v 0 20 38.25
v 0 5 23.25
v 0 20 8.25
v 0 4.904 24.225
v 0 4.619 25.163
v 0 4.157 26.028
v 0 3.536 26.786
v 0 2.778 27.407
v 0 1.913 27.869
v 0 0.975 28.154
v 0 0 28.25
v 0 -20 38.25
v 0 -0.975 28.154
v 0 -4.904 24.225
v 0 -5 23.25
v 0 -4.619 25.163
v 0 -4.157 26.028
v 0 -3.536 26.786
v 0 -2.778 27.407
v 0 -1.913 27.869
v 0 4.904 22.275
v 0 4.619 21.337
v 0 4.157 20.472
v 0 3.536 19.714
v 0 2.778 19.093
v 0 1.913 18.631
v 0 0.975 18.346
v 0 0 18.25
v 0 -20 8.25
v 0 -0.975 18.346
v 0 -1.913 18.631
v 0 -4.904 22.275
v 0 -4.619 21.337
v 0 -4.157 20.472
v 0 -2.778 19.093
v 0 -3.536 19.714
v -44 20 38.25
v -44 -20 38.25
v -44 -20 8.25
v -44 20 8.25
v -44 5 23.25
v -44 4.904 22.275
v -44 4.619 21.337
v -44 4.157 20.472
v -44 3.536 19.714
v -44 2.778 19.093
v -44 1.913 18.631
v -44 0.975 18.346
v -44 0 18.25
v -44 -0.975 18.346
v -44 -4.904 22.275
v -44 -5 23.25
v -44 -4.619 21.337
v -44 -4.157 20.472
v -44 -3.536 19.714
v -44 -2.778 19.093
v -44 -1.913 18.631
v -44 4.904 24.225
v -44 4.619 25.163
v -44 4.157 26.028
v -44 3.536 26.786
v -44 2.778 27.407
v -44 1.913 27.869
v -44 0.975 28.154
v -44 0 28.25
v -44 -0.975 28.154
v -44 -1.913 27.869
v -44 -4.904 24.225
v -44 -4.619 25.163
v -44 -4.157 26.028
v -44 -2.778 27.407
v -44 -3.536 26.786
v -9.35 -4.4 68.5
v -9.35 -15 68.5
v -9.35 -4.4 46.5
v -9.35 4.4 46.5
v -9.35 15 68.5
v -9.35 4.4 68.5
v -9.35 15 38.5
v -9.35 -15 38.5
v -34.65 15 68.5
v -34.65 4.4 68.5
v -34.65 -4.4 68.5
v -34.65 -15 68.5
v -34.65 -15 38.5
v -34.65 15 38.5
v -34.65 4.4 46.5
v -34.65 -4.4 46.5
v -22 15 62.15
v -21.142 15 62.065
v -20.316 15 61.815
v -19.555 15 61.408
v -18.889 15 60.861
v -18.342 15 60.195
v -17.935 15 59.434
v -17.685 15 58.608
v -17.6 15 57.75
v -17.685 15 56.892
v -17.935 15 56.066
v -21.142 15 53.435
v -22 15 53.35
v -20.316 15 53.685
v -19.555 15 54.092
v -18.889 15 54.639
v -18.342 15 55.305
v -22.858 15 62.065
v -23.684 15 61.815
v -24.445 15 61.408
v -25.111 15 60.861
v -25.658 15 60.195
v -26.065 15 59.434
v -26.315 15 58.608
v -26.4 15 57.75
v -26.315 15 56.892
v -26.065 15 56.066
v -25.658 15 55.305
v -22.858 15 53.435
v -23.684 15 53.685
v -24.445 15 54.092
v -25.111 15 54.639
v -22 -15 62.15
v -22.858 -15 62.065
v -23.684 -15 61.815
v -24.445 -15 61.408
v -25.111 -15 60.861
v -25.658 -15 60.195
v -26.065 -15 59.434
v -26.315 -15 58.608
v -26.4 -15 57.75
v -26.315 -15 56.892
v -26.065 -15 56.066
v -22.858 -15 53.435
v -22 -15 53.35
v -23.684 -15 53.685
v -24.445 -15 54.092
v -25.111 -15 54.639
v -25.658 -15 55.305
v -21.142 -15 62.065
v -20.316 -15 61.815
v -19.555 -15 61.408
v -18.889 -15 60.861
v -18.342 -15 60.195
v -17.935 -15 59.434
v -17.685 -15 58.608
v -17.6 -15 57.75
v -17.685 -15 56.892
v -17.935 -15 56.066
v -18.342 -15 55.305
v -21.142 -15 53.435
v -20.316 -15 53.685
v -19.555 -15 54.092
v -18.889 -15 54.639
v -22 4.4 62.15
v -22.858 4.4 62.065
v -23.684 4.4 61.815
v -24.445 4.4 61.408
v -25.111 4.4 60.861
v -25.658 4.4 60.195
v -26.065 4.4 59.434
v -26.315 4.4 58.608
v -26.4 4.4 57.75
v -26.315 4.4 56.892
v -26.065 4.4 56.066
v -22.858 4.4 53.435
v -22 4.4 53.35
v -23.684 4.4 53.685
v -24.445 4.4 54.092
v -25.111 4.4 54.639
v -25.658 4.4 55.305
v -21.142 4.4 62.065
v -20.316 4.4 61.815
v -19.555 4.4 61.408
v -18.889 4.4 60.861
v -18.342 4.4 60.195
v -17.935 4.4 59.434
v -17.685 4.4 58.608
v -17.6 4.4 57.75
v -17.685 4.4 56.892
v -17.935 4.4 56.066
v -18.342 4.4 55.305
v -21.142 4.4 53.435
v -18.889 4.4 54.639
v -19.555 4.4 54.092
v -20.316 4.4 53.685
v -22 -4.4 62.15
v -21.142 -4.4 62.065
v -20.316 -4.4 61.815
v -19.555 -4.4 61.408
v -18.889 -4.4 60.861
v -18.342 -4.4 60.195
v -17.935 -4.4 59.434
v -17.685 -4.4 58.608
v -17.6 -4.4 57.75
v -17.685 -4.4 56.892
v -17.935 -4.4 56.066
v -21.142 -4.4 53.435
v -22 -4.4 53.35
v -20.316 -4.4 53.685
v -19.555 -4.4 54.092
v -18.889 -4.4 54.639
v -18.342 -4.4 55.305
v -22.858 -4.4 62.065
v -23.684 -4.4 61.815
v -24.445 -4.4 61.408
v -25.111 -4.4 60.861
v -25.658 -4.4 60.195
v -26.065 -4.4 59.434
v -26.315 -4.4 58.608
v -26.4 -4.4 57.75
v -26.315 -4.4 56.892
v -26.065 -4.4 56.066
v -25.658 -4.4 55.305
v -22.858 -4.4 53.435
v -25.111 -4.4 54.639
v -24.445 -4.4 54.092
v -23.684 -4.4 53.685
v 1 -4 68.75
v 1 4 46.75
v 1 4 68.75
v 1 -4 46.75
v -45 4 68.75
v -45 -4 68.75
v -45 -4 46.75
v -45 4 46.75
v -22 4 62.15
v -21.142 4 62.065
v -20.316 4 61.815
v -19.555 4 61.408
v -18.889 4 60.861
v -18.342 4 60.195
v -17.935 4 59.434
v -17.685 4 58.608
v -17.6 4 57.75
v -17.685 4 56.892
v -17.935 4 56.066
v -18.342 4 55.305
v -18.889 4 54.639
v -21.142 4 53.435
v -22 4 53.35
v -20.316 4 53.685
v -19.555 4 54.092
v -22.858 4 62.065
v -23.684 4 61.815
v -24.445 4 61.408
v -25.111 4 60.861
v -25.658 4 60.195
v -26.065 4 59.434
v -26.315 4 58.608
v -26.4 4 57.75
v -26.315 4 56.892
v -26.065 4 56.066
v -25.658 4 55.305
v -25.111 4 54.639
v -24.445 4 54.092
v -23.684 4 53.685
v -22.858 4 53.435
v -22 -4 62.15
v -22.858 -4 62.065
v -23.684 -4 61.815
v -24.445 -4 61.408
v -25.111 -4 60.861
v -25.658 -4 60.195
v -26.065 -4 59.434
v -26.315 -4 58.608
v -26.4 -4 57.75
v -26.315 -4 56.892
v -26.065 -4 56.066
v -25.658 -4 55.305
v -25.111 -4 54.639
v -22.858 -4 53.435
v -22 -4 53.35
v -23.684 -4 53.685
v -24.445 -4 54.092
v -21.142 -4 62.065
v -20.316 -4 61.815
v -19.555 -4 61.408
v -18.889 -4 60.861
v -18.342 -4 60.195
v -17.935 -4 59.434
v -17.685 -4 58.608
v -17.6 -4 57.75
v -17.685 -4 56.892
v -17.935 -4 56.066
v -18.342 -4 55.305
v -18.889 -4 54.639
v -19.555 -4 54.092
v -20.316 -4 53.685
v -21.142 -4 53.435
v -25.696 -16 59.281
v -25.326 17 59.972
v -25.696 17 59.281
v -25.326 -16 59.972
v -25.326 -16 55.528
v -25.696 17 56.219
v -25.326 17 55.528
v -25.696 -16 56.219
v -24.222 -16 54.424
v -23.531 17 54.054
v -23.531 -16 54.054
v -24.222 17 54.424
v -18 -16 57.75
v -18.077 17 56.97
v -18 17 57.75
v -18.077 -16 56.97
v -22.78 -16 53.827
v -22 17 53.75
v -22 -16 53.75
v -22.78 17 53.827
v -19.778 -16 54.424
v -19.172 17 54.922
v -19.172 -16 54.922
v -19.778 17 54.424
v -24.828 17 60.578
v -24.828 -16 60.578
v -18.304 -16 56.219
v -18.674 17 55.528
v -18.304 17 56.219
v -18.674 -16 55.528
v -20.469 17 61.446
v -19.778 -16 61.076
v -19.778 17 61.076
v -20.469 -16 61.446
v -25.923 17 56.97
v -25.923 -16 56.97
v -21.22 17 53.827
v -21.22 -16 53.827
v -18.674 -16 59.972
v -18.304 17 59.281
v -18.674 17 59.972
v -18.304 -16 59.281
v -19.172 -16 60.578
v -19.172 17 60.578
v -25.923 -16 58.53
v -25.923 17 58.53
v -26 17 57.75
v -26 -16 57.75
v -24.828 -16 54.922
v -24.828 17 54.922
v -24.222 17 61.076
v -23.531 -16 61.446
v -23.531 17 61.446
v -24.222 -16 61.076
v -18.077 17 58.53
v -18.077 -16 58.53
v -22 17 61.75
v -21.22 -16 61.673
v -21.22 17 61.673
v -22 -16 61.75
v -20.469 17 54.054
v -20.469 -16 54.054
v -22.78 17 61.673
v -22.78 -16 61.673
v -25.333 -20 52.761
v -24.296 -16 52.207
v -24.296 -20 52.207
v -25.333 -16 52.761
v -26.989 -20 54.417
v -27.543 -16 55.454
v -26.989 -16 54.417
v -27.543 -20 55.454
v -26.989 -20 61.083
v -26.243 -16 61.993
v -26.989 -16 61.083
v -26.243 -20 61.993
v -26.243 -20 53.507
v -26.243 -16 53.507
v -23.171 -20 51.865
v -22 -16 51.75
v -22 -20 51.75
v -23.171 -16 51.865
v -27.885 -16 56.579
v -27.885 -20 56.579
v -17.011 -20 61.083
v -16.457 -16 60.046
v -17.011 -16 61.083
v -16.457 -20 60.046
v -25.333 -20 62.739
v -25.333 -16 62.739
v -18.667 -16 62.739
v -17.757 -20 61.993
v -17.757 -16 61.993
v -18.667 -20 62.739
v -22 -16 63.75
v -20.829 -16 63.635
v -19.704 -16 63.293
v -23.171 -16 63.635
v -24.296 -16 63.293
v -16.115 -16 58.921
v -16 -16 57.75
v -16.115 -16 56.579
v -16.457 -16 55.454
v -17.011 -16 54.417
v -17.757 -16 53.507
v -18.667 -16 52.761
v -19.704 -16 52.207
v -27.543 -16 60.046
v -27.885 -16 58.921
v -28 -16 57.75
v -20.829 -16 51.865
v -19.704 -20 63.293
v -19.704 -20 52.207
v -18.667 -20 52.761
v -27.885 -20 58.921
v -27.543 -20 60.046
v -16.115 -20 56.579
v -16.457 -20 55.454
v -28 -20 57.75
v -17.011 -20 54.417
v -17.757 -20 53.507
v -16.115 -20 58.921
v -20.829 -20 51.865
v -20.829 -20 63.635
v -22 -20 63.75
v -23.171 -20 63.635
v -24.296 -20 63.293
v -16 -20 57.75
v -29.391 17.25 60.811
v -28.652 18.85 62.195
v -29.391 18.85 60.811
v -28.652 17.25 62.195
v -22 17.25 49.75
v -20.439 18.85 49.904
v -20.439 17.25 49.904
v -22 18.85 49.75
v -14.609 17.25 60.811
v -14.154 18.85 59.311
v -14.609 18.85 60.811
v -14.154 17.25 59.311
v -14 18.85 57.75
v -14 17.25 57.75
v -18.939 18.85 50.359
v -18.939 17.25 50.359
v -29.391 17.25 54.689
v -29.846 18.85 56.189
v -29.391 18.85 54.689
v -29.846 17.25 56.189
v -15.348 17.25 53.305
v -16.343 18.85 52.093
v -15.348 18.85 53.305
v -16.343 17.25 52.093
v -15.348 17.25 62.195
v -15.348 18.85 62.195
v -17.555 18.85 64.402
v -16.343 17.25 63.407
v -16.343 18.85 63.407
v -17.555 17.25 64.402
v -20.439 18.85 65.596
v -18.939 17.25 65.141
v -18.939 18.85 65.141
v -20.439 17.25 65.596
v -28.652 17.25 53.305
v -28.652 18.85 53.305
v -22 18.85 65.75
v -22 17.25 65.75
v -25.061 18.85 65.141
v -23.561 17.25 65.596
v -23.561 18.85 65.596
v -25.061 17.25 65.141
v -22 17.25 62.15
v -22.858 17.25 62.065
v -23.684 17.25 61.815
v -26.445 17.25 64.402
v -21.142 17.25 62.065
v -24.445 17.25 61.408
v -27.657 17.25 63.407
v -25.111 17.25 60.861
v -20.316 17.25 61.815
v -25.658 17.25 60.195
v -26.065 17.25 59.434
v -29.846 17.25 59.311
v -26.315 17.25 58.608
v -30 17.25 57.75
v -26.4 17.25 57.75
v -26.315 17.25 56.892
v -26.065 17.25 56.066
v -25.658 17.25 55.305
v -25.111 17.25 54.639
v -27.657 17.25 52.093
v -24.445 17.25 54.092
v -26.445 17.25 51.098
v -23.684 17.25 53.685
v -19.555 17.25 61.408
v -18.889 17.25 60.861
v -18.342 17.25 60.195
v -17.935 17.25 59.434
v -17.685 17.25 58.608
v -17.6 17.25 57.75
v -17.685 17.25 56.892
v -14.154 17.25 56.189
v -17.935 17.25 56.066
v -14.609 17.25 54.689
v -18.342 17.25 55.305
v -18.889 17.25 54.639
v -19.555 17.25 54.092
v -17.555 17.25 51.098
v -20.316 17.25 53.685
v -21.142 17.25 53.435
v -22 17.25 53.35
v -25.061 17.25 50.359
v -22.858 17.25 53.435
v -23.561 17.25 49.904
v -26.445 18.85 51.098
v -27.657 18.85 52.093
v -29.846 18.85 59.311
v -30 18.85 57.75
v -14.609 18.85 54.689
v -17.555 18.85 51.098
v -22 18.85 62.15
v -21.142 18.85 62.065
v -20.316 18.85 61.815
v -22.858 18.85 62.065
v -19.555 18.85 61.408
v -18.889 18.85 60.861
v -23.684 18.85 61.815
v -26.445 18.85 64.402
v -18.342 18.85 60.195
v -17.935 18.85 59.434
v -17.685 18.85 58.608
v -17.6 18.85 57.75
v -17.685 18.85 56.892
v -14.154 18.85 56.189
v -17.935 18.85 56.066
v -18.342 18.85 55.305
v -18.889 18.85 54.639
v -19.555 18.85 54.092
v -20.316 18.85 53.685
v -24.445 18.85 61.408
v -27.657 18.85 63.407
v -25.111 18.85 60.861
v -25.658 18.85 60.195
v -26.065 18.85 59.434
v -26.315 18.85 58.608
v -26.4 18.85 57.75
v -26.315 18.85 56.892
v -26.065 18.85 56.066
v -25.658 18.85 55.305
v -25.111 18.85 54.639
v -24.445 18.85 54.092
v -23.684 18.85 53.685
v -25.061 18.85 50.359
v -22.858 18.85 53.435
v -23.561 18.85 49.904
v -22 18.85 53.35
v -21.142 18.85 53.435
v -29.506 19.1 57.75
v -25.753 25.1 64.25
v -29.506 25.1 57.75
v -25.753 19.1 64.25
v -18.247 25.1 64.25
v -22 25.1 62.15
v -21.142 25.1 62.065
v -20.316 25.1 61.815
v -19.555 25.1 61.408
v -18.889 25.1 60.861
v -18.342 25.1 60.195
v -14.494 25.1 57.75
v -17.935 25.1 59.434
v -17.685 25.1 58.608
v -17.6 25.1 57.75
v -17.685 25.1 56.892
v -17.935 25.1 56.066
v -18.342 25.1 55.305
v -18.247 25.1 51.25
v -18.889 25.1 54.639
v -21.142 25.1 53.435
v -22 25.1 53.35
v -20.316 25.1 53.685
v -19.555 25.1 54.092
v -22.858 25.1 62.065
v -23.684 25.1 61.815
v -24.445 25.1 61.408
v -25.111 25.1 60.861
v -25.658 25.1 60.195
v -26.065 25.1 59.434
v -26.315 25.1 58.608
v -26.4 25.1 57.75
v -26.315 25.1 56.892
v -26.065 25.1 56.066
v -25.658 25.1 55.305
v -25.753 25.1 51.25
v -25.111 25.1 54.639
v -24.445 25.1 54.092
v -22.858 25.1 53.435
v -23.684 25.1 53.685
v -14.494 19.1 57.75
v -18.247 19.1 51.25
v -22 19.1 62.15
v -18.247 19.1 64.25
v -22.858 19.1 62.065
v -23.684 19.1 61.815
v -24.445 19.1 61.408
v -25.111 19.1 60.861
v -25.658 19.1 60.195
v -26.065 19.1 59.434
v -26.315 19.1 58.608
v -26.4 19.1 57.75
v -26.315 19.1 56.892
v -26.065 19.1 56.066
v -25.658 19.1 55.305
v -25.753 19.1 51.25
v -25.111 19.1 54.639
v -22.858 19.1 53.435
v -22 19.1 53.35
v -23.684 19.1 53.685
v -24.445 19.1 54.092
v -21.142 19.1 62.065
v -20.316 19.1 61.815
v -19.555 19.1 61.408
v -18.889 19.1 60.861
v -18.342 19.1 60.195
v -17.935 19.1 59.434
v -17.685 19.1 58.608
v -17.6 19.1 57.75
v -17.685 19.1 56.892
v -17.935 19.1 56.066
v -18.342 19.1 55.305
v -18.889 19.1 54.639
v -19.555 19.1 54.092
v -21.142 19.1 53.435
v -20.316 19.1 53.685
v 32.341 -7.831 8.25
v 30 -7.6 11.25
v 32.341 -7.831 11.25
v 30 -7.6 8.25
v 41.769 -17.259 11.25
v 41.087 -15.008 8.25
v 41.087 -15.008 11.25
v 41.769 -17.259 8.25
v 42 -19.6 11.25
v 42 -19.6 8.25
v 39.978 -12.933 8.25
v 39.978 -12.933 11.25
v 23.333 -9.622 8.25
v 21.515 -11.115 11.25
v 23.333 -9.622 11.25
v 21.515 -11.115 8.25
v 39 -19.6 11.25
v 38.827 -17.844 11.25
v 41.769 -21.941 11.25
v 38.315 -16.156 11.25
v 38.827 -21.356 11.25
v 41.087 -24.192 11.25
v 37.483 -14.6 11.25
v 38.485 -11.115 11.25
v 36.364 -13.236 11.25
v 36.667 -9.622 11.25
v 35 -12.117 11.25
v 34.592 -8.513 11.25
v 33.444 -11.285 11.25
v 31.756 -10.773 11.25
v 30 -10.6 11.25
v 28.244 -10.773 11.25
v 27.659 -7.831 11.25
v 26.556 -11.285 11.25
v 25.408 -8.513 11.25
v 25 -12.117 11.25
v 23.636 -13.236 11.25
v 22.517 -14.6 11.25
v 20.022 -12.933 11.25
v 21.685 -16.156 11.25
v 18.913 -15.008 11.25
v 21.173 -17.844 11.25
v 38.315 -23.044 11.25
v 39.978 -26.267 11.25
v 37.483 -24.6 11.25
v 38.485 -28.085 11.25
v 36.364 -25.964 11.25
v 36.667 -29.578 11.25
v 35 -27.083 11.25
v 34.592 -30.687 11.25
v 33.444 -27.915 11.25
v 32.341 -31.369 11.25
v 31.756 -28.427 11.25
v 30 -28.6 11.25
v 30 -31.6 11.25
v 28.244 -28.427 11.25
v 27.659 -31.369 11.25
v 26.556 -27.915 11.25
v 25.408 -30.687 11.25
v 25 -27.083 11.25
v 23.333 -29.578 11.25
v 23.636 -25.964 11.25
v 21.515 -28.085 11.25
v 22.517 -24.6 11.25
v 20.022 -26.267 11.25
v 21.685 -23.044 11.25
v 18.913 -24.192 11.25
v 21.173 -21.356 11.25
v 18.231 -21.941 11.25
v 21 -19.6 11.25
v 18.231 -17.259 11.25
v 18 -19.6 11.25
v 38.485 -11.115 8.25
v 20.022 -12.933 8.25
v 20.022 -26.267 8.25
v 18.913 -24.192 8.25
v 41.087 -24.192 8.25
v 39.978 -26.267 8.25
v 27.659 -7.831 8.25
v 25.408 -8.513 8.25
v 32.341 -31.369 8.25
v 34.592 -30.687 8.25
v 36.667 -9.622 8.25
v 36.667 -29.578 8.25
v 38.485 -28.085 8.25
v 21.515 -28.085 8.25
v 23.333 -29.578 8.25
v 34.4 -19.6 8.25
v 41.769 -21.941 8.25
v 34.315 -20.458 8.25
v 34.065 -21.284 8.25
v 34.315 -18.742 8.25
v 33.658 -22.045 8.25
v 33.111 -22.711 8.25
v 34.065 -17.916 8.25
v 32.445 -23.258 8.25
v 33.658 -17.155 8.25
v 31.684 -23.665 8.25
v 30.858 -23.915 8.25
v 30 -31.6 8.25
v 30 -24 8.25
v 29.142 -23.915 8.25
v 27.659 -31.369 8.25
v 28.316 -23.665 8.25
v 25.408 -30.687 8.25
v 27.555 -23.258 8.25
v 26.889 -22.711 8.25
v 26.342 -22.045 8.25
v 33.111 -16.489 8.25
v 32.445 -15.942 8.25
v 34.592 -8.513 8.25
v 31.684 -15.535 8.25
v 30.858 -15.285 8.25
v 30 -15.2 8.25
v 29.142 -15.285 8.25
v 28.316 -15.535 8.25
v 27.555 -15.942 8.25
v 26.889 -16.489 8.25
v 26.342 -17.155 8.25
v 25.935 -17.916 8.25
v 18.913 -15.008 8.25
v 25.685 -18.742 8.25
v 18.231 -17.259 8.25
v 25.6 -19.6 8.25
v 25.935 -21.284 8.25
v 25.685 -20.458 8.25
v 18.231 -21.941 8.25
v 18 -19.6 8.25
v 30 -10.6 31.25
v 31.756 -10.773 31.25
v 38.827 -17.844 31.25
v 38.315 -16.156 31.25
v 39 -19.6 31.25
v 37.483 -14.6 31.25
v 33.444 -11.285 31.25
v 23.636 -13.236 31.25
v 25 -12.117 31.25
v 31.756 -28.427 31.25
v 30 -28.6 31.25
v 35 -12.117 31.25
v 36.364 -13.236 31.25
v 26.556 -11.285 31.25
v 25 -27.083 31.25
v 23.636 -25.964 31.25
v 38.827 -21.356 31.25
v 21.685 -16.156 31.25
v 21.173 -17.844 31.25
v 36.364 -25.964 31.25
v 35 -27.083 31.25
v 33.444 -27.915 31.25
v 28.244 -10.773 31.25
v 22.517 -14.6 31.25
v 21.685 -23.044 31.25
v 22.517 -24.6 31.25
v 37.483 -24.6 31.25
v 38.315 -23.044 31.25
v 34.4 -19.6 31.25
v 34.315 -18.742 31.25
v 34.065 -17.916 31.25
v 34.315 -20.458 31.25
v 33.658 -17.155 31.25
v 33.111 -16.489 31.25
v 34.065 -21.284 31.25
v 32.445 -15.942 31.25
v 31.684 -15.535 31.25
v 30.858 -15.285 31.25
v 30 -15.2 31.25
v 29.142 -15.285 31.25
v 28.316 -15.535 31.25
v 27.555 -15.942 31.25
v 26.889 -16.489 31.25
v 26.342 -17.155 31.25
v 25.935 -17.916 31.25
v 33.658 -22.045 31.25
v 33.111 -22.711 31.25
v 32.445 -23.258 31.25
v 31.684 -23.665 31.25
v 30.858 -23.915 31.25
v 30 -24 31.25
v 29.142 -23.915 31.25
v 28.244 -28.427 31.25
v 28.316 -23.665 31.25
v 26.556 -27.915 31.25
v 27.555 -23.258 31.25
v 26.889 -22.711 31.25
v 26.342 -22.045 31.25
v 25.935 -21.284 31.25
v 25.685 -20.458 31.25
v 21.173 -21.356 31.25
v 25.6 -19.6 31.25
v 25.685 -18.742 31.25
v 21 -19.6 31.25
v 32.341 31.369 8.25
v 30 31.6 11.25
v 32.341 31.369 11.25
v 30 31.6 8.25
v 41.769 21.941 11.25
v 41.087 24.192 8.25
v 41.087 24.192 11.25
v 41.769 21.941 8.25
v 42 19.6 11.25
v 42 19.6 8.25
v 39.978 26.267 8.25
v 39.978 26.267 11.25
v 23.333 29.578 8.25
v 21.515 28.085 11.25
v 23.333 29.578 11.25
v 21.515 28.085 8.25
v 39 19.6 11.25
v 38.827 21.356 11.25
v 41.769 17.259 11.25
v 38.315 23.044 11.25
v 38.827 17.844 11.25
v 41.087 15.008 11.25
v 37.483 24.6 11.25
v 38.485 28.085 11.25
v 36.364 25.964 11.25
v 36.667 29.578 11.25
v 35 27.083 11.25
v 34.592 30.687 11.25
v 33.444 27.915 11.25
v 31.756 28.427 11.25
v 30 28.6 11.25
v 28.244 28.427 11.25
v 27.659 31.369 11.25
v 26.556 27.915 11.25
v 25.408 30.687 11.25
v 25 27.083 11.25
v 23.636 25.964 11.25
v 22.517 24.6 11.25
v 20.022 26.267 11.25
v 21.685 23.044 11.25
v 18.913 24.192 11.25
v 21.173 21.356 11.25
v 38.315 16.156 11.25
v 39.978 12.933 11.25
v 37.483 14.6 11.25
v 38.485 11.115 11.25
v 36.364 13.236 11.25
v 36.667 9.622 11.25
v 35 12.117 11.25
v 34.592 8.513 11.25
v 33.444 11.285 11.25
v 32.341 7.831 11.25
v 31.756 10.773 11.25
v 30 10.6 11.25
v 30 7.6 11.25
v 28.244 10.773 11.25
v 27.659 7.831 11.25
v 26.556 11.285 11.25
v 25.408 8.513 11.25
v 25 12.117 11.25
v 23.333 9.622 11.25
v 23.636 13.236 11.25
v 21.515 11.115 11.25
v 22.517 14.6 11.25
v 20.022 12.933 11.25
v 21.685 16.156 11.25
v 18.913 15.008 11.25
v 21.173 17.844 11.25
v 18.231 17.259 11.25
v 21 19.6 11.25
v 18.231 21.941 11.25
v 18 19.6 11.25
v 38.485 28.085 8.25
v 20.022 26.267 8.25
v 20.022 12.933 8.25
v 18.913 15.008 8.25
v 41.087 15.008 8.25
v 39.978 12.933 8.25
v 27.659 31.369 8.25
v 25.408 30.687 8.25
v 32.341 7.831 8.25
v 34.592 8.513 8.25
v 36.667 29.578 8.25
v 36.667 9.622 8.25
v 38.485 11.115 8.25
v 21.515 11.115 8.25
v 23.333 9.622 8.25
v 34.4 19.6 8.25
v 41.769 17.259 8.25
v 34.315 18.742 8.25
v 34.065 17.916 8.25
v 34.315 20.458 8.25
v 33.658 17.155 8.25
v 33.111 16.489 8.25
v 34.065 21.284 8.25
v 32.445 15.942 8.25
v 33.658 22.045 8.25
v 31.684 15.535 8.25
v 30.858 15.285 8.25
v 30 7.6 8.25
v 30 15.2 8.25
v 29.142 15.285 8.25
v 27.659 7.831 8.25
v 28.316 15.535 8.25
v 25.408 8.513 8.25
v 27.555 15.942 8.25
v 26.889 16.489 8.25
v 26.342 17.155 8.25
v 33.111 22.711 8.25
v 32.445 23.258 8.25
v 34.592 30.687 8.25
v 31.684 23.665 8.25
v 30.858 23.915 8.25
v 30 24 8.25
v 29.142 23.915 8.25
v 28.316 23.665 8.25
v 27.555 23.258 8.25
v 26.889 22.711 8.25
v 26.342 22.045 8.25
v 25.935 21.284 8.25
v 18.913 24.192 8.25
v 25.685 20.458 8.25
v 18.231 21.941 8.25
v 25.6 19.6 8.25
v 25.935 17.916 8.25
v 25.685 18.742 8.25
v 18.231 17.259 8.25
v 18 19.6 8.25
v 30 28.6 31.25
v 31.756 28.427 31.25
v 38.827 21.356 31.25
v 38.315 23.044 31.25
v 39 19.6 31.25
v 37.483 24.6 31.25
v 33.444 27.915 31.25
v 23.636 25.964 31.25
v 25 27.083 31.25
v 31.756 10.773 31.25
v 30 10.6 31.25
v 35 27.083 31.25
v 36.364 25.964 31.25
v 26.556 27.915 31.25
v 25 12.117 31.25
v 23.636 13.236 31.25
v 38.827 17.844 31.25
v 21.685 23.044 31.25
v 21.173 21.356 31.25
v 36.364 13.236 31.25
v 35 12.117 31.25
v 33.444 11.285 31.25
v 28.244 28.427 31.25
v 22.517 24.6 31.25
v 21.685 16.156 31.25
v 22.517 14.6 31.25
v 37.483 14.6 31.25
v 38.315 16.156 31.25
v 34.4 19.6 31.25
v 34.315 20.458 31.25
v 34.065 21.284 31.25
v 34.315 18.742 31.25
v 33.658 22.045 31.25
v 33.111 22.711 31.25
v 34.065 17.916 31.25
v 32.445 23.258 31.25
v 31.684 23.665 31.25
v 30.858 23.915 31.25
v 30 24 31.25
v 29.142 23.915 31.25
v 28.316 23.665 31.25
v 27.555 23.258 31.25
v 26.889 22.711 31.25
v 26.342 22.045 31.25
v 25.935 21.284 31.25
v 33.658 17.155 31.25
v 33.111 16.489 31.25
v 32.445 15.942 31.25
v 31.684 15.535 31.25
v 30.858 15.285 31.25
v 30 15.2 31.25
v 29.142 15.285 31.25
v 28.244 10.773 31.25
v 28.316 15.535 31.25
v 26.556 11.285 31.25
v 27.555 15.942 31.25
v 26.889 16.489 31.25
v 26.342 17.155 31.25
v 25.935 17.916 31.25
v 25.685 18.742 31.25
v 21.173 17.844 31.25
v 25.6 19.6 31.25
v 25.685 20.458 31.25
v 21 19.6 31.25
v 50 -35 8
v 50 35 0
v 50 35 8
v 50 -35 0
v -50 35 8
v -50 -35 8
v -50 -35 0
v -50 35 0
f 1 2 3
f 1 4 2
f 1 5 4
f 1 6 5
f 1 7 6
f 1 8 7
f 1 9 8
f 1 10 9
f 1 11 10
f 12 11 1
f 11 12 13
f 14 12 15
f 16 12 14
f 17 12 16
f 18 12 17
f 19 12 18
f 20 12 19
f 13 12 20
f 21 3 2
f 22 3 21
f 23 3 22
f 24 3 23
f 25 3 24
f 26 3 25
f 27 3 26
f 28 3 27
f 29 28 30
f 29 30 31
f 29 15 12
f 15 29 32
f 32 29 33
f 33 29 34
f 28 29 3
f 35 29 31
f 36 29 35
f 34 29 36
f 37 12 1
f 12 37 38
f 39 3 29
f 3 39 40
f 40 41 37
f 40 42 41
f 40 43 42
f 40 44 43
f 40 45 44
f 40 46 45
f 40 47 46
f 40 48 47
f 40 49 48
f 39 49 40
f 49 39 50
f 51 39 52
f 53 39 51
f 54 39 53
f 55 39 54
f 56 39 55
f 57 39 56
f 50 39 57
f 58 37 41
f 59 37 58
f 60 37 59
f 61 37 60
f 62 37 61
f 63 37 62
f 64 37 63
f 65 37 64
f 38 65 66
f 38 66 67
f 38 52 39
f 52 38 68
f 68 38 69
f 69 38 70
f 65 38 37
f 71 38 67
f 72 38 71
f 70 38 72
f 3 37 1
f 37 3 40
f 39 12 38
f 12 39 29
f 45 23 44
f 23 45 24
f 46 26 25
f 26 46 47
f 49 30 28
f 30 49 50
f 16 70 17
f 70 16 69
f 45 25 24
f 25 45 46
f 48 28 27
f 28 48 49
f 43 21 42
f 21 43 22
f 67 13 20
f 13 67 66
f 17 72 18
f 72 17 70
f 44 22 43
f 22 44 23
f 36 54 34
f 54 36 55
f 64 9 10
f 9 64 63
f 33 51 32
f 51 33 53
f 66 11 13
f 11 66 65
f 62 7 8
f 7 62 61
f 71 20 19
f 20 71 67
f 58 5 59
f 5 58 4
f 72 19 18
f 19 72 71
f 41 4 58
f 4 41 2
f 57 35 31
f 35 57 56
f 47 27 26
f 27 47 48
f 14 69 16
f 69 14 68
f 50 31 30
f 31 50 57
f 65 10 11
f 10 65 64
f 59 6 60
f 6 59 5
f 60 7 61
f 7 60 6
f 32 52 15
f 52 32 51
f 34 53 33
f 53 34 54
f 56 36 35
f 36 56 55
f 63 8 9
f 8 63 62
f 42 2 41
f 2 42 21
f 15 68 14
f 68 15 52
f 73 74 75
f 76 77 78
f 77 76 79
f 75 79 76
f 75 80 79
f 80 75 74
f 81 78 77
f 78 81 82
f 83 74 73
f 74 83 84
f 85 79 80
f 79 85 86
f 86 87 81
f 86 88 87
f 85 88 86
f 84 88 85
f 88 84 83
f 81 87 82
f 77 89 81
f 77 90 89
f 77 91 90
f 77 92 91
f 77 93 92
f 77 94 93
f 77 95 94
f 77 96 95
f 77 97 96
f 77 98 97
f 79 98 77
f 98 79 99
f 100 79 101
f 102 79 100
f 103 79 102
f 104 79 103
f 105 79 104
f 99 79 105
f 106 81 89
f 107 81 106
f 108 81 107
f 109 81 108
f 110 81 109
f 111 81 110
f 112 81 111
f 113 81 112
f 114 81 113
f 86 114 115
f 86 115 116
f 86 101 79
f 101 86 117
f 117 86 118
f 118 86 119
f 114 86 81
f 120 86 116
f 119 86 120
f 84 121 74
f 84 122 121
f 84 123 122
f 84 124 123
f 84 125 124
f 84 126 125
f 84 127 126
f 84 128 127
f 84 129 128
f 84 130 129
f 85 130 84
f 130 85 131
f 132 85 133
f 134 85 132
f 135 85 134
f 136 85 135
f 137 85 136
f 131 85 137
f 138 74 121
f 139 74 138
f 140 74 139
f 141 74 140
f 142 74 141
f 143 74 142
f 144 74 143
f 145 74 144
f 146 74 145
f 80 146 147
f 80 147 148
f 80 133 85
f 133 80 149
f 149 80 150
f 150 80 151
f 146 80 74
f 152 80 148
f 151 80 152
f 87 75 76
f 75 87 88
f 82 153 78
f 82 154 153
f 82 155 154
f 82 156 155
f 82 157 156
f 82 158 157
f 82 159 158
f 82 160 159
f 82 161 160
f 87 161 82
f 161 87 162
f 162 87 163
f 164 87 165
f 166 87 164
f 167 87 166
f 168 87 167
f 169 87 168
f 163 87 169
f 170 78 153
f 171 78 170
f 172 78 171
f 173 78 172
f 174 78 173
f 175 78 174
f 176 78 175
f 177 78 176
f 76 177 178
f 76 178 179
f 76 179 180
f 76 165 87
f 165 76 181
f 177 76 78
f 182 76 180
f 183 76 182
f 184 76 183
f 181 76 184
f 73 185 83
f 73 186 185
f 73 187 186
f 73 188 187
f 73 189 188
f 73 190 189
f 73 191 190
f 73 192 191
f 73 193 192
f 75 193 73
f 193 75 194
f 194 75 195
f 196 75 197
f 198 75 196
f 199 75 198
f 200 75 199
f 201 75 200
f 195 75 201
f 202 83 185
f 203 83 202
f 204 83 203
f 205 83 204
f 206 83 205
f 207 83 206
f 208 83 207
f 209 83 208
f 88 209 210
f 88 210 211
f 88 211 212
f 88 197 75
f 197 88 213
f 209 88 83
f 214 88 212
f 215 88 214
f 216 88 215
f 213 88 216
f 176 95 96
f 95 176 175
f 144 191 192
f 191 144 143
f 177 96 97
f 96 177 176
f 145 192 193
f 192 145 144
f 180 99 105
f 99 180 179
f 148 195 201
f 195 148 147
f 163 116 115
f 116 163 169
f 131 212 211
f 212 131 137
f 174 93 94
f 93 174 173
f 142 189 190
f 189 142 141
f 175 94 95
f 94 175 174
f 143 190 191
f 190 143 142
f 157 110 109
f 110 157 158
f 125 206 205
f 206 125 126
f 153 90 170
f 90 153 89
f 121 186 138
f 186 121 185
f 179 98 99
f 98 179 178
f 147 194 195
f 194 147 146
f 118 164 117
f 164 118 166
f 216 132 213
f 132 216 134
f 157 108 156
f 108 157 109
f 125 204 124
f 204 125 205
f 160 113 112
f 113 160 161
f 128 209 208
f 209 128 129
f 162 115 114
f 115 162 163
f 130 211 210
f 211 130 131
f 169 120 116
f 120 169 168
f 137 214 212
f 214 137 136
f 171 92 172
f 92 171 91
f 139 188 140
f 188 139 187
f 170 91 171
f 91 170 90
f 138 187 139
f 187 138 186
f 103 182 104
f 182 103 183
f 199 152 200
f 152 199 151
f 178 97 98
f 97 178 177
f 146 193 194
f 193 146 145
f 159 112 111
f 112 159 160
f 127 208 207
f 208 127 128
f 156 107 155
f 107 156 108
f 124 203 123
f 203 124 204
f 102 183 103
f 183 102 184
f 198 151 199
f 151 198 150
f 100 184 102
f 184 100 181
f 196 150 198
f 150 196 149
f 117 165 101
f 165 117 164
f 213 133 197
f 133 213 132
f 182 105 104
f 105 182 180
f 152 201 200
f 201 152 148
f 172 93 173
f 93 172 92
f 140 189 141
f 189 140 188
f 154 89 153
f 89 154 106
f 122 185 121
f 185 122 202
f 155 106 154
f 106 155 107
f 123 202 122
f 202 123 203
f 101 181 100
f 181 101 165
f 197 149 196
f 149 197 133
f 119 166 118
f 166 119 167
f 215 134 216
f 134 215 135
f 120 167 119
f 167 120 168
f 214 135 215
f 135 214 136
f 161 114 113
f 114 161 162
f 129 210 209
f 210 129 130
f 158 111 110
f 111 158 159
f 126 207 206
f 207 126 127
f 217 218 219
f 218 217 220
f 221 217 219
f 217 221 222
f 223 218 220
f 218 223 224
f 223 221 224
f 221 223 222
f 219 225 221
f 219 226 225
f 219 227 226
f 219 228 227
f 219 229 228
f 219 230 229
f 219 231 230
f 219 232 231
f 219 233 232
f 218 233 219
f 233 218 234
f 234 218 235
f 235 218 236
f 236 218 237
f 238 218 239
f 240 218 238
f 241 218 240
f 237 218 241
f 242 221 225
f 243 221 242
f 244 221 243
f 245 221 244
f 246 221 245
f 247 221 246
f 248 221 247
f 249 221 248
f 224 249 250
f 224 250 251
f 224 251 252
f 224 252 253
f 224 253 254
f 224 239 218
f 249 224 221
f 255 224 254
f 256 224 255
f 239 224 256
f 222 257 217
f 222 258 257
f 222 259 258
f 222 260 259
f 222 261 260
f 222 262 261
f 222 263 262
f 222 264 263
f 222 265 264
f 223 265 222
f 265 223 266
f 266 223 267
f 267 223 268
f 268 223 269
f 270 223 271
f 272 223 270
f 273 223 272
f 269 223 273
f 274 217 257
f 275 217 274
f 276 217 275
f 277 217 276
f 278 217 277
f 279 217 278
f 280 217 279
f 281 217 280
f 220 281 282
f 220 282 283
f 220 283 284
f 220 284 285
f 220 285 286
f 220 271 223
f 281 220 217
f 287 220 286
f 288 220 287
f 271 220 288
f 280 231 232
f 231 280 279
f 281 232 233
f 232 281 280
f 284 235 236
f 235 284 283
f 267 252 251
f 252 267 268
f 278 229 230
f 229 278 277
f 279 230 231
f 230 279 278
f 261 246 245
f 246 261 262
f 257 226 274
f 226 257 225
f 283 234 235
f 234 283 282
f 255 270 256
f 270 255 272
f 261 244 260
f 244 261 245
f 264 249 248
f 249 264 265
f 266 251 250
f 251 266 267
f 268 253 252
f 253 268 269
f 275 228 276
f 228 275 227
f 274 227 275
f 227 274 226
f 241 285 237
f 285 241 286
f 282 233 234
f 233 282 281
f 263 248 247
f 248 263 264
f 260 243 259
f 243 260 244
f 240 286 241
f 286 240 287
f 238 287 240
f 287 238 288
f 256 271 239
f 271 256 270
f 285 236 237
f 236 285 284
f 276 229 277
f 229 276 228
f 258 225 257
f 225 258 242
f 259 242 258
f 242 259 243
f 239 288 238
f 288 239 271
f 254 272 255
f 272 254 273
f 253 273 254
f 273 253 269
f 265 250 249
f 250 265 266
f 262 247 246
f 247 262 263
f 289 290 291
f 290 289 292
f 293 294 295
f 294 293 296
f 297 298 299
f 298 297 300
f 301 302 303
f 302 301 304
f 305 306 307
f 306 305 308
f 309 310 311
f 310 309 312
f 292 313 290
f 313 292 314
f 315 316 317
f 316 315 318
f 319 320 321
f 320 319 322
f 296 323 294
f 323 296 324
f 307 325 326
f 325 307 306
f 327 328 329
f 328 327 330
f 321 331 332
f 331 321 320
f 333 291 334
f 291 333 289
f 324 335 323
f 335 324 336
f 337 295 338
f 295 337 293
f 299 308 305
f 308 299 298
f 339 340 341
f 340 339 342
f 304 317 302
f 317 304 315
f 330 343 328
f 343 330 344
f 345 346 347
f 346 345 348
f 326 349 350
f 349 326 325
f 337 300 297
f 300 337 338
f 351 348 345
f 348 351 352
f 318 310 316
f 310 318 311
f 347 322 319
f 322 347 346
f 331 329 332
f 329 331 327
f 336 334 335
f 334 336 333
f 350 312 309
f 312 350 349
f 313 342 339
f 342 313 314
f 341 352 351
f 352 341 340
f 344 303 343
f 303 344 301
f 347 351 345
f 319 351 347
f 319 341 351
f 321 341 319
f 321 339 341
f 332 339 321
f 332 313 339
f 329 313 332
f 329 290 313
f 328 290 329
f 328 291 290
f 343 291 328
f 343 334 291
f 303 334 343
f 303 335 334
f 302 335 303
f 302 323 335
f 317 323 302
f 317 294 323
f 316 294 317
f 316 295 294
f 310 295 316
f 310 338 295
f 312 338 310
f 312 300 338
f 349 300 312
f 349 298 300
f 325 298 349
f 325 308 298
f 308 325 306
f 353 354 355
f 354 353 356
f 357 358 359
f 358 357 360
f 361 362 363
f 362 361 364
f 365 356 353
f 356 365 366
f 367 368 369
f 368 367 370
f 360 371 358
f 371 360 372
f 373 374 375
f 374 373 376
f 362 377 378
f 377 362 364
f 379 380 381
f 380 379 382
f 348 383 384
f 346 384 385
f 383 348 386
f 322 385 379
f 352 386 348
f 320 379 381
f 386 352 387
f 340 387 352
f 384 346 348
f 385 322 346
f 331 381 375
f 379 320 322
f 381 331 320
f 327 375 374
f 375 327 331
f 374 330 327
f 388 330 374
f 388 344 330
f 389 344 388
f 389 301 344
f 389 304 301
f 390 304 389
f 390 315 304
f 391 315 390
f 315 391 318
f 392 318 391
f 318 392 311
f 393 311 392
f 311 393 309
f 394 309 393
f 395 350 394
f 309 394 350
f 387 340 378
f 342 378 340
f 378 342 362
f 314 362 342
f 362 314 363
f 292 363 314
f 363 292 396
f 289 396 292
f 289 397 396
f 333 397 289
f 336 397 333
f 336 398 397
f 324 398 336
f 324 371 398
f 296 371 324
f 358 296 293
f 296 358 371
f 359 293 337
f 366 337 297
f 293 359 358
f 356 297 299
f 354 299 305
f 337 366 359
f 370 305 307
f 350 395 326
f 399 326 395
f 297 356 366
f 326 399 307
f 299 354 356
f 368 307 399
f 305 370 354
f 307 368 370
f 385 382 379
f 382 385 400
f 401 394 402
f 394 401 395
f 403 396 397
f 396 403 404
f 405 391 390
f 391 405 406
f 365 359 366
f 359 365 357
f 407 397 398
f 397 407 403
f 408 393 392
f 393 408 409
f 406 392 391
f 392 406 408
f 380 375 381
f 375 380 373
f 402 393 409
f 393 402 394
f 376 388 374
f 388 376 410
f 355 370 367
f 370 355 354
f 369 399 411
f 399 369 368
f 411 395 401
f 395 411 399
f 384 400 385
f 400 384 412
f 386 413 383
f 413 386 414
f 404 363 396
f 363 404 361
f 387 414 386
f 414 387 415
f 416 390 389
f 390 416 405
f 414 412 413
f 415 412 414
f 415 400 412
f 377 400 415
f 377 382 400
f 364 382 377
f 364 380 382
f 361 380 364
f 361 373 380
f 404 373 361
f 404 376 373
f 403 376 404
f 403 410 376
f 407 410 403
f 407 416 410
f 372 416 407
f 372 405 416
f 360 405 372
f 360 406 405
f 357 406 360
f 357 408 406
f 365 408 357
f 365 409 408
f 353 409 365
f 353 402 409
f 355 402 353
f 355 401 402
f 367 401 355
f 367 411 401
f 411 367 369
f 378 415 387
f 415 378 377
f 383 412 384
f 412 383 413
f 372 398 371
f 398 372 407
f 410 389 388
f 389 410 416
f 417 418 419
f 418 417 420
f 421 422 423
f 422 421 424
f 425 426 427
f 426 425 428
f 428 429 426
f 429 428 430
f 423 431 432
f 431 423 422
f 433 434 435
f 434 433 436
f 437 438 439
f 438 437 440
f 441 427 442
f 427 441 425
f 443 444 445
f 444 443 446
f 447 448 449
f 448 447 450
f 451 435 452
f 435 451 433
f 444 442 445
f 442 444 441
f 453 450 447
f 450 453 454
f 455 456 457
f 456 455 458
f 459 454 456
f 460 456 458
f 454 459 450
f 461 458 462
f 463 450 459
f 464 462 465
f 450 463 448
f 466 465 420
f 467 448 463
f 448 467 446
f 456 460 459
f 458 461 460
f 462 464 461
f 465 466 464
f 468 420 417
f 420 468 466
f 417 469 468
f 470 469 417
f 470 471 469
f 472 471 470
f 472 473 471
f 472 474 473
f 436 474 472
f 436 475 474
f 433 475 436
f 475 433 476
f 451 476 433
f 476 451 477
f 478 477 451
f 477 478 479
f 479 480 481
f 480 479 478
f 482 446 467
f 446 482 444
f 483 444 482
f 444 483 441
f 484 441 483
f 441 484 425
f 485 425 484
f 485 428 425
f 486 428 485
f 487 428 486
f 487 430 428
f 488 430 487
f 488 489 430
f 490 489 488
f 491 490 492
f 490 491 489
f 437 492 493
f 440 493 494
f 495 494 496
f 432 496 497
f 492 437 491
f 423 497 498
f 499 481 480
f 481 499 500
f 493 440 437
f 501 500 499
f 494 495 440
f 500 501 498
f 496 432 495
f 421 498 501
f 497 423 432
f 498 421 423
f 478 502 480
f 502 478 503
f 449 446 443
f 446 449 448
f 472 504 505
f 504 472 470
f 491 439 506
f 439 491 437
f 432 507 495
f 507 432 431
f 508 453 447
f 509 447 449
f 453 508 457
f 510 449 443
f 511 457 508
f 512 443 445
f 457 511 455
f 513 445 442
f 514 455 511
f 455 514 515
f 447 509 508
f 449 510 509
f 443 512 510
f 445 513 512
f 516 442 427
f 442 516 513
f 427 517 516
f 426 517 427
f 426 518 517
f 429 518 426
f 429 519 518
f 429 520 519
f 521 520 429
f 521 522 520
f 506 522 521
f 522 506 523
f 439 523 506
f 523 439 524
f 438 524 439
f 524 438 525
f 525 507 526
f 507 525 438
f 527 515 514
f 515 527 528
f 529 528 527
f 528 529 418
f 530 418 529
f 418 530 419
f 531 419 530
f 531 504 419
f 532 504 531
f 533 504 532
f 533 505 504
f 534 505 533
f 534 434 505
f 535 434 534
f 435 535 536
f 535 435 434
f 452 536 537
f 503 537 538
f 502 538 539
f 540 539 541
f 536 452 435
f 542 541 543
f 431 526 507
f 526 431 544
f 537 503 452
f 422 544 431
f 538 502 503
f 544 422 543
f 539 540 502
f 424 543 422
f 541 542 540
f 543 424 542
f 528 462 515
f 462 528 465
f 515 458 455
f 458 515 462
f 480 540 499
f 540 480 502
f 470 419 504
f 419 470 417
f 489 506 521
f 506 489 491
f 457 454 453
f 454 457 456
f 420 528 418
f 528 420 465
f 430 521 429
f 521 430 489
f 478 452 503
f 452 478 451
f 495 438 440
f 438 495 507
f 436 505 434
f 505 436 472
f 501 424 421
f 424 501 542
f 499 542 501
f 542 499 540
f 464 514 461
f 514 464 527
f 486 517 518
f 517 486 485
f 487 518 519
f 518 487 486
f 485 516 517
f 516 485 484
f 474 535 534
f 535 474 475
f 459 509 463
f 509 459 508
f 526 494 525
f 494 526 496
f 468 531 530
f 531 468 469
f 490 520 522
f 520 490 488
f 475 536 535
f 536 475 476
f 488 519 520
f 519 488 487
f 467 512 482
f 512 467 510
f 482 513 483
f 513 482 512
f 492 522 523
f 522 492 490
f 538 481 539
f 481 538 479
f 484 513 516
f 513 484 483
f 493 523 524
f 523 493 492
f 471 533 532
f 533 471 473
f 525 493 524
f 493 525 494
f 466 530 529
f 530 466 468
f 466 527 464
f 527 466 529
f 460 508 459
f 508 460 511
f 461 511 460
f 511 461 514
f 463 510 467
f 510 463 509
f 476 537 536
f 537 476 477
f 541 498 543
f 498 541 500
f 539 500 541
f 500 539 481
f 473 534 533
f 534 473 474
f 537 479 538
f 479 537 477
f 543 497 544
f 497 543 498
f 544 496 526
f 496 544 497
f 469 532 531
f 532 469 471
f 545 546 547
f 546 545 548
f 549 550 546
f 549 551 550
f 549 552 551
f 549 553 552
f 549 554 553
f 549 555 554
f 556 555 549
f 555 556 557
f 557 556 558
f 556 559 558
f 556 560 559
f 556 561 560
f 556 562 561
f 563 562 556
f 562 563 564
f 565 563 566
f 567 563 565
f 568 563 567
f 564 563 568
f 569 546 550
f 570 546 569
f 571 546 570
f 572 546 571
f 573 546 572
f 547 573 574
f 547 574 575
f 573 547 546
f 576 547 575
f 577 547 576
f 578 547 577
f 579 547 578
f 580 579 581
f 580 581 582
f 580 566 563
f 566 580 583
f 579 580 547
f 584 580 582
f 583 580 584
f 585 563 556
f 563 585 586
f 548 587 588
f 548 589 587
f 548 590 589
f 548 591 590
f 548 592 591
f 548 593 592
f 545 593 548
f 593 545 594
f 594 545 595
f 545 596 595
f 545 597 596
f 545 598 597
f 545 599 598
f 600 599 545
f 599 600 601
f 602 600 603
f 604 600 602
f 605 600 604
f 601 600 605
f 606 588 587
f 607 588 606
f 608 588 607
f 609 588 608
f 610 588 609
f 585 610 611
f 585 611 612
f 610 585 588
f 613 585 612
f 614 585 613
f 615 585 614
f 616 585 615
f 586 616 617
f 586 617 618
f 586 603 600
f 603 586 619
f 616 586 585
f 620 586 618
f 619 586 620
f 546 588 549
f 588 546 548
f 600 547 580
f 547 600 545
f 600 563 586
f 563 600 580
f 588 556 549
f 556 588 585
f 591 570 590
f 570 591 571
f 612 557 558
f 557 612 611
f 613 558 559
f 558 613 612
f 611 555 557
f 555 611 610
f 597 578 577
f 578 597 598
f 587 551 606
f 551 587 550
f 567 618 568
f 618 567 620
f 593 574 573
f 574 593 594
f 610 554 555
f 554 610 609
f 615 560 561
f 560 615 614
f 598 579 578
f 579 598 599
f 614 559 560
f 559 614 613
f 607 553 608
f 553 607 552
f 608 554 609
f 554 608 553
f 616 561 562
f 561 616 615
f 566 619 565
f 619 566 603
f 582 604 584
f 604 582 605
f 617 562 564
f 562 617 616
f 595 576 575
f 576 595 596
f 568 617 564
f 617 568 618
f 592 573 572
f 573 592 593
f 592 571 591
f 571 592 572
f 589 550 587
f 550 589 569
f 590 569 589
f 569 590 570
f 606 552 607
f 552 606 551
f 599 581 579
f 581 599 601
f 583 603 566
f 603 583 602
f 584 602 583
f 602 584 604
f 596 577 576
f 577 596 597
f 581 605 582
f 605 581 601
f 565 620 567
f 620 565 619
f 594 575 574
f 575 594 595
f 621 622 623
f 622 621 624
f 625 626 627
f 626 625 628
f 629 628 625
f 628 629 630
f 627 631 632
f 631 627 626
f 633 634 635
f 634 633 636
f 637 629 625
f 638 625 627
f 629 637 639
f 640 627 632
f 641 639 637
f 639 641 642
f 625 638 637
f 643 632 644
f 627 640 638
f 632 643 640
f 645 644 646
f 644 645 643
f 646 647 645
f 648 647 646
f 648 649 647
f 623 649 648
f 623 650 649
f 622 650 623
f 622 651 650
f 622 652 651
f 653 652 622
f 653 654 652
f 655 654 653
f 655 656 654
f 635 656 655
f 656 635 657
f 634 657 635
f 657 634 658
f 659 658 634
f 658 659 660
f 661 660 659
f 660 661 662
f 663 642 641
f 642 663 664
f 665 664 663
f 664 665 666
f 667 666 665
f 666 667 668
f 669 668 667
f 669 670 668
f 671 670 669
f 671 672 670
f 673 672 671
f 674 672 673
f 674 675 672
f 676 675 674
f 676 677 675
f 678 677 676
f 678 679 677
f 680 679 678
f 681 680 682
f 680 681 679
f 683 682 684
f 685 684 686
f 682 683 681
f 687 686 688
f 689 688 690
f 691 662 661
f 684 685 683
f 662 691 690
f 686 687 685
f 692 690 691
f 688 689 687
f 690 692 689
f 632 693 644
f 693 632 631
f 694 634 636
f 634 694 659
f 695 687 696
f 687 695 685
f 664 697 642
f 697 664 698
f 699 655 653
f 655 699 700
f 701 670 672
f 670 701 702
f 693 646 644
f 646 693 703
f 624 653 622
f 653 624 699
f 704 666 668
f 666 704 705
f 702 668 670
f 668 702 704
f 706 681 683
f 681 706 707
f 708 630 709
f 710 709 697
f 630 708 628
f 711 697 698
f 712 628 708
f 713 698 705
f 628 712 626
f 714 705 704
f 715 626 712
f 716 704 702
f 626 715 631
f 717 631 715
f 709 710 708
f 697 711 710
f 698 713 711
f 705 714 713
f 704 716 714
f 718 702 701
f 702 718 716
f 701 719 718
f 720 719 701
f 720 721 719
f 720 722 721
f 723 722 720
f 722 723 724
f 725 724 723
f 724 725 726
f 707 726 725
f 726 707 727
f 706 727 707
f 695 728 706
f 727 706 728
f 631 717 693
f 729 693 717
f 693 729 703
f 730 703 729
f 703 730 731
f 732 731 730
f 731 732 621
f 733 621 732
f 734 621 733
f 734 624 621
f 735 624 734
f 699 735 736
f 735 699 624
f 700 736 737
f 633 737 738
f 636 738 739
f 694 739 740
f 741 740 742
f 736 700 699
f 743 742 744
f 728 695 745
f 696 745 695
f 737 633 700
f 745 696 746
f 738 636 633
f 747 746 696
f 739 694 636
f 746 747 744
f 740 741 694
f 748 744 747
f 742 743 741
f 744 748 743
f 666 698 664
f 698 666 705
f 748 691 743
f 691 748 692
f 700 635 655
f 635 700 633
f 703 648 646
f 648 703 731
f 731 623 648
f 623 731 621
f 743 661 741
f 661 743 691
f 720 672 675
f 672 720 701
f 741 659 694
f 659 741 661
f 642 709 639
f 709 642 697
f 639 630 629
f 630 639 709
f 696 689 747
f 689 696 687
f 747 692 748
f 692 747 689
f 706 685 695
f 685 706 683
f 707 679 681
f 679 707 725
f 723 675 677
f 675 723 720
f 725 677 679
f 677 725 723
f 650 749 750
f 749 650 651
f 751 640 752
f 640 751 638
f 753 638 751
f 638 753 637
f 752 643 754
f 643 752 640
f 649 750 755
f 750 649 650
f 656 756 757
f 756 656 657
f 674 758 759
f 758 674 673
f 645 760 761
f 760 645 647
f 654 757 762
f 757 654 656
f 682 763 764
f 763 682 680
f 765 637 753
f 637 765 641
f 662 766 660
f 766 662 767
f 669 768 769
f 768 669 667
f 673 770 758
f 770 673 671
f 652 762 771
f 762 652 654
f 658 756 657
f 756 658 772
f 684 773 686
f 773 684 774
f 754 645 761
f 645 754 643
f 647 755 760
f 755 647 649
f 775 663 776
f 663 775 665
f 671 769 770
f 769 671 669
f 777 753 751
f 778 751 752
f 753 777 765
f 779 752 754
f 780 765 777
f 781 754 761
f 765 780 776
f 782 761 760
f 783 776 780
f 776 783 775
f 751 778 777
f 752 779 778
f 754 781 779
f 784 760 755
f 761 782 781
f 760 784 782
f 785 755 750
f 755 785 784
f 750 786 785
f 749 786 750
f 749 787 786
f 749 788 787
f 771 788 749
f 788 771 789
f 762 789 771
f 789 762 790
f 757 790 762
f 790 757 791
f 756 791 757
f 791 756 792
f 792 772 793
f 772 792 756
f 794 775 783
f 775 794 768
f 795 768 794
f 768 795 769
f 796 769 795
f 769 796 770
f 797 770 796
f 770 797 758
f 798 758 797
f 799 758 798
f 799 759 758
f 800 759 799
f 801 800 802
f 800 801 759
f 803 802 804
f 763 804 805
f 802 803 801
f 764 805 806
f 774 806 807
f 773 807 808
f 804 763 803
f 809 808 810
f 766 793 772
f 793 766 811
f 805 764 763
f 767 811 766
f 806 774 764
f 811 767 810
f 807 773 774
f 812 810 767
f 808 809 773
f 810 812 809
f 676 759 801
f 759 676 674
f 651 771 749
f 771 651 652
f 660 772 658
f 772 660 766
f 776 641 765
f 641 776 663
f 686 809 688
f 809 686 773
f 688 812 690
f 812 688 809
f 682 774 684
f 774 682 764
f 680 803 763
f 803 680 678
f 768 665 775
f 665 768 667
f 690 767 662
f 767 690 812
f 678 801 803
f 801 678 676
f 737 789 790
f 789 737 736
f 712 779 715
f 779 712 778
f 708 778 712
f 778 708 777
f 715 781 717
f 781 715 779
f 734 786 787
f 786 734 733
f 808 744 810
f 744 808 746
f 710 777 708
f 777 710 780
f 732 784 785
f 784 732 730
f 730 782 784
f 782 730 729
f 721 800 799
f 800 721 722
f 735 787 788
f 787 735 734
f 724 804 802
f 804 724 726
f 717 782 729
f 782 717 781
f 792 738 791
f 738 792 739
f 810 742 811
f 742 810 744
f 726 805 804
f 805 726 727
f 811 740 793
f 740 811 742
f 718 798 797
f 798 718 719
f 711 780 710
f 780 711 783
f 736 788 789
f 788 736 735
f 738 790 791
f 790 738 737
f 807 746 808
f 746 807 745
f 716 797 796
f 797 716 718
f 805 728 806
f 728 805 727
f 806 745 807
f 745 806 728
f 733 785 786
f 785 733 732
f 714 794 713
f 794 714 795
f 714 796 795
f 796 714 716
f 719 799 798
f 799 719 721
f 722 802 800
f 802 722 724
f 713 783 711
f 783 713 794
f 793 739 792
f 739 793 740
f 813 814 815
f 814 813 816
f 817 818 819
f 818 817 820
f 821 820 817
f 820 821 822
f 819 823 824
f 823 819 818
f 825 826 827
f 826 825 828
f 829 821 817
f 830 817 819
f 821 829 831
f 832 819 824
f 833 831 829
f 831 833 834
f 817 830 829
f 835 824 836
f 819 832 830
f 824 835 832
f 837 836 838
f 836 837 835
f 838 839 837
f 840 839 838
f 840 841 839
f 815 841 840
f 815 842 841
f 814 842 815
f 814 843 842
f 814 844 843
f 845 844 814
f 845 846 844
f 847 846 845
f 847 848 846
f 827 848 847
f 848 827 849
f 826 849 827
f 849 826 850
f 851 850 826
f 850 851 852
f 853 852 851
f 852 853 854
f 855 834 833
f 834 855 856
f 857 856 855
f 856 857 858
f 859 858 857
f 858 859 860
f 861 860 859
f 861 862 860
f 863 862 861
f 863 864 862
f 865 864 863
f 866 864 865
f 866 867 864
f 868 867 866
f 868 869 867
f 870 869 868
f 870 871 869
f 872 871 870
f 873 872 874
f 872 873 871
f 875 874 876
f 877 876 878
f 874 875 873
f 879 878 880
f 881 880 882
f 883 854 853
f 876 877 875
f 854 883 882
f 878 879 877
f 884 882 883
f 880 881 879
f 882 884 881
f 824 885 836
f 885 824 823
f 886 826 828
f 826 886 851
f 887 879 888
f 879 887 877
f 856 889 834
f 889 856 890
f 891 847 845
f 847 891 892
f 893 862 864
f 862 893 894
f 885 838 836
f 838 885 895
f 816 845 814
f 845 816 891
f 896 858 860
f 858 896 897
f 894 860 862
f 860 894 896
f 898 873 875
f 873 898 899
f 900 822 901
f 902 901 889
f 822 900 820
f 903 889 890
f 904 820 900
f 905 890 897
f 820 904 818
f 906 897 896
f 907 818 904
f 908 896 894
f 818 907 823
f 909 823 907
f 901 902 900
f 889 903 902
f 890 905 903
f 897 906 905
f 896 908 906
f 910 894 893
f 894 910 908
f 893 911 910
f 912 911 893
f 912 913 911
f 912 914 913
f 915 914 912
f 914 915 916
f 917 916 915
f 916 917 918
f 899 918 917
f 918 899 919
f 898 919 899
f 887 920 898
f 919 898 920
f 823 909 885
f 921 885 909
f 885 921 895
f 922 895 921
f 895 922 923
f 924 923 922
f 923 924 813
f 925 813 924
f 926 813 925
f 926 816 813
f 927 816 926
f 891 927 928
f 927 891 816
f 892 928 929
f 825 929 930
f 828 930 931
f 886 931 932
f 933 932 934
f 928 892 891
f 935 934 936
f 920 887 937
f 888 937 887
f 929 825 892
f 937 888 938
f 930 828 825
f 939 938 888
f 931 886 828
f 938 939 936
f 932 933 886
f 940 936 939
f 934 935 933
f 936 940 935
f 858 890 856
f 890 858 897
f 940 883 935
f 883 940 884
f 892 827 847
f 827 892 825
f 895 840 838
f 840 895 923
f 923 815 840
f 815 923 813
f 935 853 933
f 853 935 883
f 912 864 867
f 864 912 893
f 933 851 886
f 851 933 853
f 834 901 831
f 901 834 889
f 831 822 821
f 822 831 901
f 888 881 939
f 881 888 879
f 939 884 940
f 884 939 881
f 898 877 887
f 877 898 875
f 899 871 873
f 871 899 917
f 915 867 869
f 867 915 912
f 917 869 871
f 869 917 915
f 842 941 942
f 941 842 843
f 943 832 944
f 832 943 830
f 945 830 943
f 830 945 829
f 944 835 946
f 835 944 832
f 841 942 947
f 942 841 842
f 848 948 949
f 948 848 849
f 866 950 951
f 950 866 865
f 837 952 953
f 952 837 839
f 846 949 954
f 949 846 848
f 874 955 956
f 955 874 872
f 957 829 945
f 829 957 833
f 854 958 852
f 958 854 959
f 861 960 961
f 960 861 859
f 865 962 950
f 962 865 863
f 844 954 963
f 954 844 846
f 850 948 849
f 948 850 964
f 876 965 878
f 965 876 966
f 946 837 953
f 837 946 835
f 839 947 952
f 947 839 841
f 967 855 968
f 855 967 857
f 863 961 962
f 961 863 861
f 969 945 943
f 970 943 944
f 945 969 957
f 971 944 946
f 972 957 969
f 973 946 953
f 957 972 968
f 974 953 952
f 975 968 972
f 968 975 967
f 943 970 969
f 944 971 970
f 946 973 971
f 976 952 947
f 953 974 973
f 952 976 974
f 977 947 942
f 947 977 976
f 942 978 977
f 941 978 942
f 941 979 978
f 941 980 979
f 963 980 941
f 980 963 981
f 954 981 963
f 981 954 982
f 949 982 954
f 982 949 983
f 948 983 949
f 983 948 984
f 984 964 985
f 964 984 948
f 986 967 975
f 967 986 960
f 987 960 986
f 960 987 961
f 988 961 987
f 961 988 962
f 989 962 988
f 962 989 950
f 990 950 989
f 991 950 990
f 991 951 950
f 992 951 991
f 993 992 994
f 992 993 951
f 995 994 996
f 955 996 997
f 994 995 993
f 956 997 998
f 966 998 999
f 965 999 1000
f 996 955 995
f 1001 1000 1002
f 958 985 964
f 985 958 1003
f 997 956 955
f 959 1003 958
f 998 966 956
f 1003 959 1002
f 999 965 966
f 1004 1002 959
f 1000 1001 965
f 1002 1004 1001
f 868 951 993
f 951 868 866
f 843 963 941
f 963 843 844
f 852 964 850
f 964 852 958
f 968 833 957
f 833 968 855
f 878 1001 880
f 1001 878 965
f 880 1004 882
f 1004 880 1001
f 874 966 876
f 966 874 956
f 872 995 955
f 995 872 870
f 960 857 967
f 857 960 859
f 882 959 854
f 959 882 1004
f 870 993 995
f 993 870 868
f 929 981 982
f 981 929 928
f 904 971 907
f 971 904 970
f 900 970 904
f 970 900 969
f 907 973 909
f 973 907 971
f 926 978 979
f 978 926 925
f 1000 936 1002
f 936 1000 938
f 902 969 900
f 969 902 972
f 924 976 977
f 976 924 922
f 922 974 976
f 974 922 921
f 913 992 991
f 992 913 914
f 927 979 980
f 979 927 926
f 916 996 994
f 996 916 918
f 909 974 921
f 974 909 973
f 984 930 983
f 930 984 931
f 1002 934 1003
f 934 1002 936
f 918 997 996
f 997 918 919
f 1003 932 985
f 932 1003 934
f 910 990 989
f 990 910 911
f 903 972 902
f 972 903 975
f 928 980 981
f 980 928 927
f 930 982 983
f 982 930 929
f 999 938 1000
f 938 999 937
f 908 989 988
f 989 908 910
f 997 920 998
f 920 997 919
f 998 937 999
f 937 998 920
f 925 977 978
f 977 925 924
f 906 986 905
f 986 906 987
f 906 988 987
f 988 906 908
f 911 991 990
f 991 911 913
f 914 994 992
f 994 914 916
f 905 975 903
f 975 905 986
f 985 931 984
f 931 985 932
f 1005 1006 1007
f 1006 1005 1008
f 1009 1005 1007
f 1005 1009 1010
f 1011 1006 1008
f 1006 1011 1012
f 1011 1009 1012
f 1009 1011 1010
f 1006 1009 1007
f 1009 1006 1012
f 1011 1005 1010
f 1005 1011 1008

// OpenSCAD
$fn = 32;

// ------------------------------------------------------------------------
// Indexing jig: plate 100 x 70 mm, pin d8
// Every part is its own module, assembly() places every instance.
// ------------------------------------------------------------------------

// --- part 1 ---
module jig_plate() {
  difference() {
    translate([-50, -35, 0]) cube([100, 70, 8]);
  }
}

// --- part 2 ---
module locator_block() {
  difference() {
    translate([-22, -20, 0]) cube([44, 40, 30]);
    translate([0, 0, 15]) rotate([0, 90, 0]) cylinder(h = 46, d = 10, center = true);
  }
}

// --- part 3 ---
module index_fork() {
  difference() {
    translate([-12.65, -15, 0]) cube([25.3, 30, 30]);
    translate([-13.65, -4.4, 8]) cube([27.3, 8.8, 23]);
    translate([0, 0, 19.25]) rotate([90, 0, 0]) cylinder(h = 32, d = 8.8, center = true);
  }
}

// --- part 4 ---
module index_arm() {
  difference() {
    translate([-23, -4, 0]) cube([46, 8, 22]);
    translate([0, 0, 11]) rotate([90, 0, 0]) cylinder(h = 10, d = 8.8, center = true);
  }
}

// --- part 5 ---
module index_pin() {
  rotate([0, 90, 0]) cylinder(h = 34, d = 8, center = true);
  translate([-20, 0, 0]) rotate([0, 90, 0]) cylinder(h = 4, d = 12);
}

// --- part 6 ---
module pin_washer() {
  difference() {
      translate([0, 0, 0]) cylinder(h = 1.6, d = 16);
      translate([0, 0, -1]) cylinder(h = 3.6, d = 8.8);
    }
}

// --- part 7 ---
module lock_nut() {
  difference() {
    linear_extrude(height = 6) polygon(points = [[7.506, 0], [3.753, 6.5], [-3.753, 6.5], [-7.506, 0], [-3.753, -6.5], [3.753, -6.5]]);
    translate([0, 0, -1]) cylinder(h = 8, d = 8.8);
  }
}

// --- part 8 ---
module guide_bush_a() {
  difference() {
    union() {
      cylinder(h = 3, d = 24);
      translate([0, 0, 3]) cylinder(h = 20, d = 18);
    }
    translate([0, 0, -1]) cylinder(h = 25, d = 8.8);
  }
}

// --- part 9 ---
module guide_bush_b() {
  difference() {
    union() {
      cylinder(h = 3, d = 24);
      translate([0, 0, 3]) cylinder(h = 20, d = 18);
    }
    translate([0, 0, -1]) cylinder(h = 25, d = 8.8);
  }
}

// --- assembly ---
module assembly() {
  color([0.80, 0.24, 0.20]) translate([0, 0, 0]) rotate([0, 0, 0]) jig_plate();
  color([0.20, 0.45, 0.75]) translate([-22, 0, 8.25]) rotate([0, 0, 0]) locator_block();
  color([0.25, 0.62, 0.32]) translate([-22, 0, 38.5]) rotate([0, 0, 0]) index_fork();
  color([0.92, 0.70, 0.18]) translate([-22, 0, 46.75]) rotate([0, 0, 0]) index_arm();
  color([0.58, 0.35, 0.70]) translate([-22, 0, 57.75]) rotate([0, 0, 90]) index_pin();
  color([0.16, 0.66, 0.66]) translate([-22, 18.85, 57.75]) rotate([90, 0, 0]) pin_washer();
  color([0.85, 0.48, 0.18]) translate([-22, 25.1, 57.75]) rotate([90, 0, 0]) lock_nut();
  color([0.55, 0.60, 0.65]) translate([30, -19.6, 8.25]) rotate([0, 0, 0]) guide_bush_a();
  color([0.75, 0.30, 0.55]) translate([30, 19.6, 8.25]) rotate([0, 0, 0]) guide_bush_b();
}

assembly();
